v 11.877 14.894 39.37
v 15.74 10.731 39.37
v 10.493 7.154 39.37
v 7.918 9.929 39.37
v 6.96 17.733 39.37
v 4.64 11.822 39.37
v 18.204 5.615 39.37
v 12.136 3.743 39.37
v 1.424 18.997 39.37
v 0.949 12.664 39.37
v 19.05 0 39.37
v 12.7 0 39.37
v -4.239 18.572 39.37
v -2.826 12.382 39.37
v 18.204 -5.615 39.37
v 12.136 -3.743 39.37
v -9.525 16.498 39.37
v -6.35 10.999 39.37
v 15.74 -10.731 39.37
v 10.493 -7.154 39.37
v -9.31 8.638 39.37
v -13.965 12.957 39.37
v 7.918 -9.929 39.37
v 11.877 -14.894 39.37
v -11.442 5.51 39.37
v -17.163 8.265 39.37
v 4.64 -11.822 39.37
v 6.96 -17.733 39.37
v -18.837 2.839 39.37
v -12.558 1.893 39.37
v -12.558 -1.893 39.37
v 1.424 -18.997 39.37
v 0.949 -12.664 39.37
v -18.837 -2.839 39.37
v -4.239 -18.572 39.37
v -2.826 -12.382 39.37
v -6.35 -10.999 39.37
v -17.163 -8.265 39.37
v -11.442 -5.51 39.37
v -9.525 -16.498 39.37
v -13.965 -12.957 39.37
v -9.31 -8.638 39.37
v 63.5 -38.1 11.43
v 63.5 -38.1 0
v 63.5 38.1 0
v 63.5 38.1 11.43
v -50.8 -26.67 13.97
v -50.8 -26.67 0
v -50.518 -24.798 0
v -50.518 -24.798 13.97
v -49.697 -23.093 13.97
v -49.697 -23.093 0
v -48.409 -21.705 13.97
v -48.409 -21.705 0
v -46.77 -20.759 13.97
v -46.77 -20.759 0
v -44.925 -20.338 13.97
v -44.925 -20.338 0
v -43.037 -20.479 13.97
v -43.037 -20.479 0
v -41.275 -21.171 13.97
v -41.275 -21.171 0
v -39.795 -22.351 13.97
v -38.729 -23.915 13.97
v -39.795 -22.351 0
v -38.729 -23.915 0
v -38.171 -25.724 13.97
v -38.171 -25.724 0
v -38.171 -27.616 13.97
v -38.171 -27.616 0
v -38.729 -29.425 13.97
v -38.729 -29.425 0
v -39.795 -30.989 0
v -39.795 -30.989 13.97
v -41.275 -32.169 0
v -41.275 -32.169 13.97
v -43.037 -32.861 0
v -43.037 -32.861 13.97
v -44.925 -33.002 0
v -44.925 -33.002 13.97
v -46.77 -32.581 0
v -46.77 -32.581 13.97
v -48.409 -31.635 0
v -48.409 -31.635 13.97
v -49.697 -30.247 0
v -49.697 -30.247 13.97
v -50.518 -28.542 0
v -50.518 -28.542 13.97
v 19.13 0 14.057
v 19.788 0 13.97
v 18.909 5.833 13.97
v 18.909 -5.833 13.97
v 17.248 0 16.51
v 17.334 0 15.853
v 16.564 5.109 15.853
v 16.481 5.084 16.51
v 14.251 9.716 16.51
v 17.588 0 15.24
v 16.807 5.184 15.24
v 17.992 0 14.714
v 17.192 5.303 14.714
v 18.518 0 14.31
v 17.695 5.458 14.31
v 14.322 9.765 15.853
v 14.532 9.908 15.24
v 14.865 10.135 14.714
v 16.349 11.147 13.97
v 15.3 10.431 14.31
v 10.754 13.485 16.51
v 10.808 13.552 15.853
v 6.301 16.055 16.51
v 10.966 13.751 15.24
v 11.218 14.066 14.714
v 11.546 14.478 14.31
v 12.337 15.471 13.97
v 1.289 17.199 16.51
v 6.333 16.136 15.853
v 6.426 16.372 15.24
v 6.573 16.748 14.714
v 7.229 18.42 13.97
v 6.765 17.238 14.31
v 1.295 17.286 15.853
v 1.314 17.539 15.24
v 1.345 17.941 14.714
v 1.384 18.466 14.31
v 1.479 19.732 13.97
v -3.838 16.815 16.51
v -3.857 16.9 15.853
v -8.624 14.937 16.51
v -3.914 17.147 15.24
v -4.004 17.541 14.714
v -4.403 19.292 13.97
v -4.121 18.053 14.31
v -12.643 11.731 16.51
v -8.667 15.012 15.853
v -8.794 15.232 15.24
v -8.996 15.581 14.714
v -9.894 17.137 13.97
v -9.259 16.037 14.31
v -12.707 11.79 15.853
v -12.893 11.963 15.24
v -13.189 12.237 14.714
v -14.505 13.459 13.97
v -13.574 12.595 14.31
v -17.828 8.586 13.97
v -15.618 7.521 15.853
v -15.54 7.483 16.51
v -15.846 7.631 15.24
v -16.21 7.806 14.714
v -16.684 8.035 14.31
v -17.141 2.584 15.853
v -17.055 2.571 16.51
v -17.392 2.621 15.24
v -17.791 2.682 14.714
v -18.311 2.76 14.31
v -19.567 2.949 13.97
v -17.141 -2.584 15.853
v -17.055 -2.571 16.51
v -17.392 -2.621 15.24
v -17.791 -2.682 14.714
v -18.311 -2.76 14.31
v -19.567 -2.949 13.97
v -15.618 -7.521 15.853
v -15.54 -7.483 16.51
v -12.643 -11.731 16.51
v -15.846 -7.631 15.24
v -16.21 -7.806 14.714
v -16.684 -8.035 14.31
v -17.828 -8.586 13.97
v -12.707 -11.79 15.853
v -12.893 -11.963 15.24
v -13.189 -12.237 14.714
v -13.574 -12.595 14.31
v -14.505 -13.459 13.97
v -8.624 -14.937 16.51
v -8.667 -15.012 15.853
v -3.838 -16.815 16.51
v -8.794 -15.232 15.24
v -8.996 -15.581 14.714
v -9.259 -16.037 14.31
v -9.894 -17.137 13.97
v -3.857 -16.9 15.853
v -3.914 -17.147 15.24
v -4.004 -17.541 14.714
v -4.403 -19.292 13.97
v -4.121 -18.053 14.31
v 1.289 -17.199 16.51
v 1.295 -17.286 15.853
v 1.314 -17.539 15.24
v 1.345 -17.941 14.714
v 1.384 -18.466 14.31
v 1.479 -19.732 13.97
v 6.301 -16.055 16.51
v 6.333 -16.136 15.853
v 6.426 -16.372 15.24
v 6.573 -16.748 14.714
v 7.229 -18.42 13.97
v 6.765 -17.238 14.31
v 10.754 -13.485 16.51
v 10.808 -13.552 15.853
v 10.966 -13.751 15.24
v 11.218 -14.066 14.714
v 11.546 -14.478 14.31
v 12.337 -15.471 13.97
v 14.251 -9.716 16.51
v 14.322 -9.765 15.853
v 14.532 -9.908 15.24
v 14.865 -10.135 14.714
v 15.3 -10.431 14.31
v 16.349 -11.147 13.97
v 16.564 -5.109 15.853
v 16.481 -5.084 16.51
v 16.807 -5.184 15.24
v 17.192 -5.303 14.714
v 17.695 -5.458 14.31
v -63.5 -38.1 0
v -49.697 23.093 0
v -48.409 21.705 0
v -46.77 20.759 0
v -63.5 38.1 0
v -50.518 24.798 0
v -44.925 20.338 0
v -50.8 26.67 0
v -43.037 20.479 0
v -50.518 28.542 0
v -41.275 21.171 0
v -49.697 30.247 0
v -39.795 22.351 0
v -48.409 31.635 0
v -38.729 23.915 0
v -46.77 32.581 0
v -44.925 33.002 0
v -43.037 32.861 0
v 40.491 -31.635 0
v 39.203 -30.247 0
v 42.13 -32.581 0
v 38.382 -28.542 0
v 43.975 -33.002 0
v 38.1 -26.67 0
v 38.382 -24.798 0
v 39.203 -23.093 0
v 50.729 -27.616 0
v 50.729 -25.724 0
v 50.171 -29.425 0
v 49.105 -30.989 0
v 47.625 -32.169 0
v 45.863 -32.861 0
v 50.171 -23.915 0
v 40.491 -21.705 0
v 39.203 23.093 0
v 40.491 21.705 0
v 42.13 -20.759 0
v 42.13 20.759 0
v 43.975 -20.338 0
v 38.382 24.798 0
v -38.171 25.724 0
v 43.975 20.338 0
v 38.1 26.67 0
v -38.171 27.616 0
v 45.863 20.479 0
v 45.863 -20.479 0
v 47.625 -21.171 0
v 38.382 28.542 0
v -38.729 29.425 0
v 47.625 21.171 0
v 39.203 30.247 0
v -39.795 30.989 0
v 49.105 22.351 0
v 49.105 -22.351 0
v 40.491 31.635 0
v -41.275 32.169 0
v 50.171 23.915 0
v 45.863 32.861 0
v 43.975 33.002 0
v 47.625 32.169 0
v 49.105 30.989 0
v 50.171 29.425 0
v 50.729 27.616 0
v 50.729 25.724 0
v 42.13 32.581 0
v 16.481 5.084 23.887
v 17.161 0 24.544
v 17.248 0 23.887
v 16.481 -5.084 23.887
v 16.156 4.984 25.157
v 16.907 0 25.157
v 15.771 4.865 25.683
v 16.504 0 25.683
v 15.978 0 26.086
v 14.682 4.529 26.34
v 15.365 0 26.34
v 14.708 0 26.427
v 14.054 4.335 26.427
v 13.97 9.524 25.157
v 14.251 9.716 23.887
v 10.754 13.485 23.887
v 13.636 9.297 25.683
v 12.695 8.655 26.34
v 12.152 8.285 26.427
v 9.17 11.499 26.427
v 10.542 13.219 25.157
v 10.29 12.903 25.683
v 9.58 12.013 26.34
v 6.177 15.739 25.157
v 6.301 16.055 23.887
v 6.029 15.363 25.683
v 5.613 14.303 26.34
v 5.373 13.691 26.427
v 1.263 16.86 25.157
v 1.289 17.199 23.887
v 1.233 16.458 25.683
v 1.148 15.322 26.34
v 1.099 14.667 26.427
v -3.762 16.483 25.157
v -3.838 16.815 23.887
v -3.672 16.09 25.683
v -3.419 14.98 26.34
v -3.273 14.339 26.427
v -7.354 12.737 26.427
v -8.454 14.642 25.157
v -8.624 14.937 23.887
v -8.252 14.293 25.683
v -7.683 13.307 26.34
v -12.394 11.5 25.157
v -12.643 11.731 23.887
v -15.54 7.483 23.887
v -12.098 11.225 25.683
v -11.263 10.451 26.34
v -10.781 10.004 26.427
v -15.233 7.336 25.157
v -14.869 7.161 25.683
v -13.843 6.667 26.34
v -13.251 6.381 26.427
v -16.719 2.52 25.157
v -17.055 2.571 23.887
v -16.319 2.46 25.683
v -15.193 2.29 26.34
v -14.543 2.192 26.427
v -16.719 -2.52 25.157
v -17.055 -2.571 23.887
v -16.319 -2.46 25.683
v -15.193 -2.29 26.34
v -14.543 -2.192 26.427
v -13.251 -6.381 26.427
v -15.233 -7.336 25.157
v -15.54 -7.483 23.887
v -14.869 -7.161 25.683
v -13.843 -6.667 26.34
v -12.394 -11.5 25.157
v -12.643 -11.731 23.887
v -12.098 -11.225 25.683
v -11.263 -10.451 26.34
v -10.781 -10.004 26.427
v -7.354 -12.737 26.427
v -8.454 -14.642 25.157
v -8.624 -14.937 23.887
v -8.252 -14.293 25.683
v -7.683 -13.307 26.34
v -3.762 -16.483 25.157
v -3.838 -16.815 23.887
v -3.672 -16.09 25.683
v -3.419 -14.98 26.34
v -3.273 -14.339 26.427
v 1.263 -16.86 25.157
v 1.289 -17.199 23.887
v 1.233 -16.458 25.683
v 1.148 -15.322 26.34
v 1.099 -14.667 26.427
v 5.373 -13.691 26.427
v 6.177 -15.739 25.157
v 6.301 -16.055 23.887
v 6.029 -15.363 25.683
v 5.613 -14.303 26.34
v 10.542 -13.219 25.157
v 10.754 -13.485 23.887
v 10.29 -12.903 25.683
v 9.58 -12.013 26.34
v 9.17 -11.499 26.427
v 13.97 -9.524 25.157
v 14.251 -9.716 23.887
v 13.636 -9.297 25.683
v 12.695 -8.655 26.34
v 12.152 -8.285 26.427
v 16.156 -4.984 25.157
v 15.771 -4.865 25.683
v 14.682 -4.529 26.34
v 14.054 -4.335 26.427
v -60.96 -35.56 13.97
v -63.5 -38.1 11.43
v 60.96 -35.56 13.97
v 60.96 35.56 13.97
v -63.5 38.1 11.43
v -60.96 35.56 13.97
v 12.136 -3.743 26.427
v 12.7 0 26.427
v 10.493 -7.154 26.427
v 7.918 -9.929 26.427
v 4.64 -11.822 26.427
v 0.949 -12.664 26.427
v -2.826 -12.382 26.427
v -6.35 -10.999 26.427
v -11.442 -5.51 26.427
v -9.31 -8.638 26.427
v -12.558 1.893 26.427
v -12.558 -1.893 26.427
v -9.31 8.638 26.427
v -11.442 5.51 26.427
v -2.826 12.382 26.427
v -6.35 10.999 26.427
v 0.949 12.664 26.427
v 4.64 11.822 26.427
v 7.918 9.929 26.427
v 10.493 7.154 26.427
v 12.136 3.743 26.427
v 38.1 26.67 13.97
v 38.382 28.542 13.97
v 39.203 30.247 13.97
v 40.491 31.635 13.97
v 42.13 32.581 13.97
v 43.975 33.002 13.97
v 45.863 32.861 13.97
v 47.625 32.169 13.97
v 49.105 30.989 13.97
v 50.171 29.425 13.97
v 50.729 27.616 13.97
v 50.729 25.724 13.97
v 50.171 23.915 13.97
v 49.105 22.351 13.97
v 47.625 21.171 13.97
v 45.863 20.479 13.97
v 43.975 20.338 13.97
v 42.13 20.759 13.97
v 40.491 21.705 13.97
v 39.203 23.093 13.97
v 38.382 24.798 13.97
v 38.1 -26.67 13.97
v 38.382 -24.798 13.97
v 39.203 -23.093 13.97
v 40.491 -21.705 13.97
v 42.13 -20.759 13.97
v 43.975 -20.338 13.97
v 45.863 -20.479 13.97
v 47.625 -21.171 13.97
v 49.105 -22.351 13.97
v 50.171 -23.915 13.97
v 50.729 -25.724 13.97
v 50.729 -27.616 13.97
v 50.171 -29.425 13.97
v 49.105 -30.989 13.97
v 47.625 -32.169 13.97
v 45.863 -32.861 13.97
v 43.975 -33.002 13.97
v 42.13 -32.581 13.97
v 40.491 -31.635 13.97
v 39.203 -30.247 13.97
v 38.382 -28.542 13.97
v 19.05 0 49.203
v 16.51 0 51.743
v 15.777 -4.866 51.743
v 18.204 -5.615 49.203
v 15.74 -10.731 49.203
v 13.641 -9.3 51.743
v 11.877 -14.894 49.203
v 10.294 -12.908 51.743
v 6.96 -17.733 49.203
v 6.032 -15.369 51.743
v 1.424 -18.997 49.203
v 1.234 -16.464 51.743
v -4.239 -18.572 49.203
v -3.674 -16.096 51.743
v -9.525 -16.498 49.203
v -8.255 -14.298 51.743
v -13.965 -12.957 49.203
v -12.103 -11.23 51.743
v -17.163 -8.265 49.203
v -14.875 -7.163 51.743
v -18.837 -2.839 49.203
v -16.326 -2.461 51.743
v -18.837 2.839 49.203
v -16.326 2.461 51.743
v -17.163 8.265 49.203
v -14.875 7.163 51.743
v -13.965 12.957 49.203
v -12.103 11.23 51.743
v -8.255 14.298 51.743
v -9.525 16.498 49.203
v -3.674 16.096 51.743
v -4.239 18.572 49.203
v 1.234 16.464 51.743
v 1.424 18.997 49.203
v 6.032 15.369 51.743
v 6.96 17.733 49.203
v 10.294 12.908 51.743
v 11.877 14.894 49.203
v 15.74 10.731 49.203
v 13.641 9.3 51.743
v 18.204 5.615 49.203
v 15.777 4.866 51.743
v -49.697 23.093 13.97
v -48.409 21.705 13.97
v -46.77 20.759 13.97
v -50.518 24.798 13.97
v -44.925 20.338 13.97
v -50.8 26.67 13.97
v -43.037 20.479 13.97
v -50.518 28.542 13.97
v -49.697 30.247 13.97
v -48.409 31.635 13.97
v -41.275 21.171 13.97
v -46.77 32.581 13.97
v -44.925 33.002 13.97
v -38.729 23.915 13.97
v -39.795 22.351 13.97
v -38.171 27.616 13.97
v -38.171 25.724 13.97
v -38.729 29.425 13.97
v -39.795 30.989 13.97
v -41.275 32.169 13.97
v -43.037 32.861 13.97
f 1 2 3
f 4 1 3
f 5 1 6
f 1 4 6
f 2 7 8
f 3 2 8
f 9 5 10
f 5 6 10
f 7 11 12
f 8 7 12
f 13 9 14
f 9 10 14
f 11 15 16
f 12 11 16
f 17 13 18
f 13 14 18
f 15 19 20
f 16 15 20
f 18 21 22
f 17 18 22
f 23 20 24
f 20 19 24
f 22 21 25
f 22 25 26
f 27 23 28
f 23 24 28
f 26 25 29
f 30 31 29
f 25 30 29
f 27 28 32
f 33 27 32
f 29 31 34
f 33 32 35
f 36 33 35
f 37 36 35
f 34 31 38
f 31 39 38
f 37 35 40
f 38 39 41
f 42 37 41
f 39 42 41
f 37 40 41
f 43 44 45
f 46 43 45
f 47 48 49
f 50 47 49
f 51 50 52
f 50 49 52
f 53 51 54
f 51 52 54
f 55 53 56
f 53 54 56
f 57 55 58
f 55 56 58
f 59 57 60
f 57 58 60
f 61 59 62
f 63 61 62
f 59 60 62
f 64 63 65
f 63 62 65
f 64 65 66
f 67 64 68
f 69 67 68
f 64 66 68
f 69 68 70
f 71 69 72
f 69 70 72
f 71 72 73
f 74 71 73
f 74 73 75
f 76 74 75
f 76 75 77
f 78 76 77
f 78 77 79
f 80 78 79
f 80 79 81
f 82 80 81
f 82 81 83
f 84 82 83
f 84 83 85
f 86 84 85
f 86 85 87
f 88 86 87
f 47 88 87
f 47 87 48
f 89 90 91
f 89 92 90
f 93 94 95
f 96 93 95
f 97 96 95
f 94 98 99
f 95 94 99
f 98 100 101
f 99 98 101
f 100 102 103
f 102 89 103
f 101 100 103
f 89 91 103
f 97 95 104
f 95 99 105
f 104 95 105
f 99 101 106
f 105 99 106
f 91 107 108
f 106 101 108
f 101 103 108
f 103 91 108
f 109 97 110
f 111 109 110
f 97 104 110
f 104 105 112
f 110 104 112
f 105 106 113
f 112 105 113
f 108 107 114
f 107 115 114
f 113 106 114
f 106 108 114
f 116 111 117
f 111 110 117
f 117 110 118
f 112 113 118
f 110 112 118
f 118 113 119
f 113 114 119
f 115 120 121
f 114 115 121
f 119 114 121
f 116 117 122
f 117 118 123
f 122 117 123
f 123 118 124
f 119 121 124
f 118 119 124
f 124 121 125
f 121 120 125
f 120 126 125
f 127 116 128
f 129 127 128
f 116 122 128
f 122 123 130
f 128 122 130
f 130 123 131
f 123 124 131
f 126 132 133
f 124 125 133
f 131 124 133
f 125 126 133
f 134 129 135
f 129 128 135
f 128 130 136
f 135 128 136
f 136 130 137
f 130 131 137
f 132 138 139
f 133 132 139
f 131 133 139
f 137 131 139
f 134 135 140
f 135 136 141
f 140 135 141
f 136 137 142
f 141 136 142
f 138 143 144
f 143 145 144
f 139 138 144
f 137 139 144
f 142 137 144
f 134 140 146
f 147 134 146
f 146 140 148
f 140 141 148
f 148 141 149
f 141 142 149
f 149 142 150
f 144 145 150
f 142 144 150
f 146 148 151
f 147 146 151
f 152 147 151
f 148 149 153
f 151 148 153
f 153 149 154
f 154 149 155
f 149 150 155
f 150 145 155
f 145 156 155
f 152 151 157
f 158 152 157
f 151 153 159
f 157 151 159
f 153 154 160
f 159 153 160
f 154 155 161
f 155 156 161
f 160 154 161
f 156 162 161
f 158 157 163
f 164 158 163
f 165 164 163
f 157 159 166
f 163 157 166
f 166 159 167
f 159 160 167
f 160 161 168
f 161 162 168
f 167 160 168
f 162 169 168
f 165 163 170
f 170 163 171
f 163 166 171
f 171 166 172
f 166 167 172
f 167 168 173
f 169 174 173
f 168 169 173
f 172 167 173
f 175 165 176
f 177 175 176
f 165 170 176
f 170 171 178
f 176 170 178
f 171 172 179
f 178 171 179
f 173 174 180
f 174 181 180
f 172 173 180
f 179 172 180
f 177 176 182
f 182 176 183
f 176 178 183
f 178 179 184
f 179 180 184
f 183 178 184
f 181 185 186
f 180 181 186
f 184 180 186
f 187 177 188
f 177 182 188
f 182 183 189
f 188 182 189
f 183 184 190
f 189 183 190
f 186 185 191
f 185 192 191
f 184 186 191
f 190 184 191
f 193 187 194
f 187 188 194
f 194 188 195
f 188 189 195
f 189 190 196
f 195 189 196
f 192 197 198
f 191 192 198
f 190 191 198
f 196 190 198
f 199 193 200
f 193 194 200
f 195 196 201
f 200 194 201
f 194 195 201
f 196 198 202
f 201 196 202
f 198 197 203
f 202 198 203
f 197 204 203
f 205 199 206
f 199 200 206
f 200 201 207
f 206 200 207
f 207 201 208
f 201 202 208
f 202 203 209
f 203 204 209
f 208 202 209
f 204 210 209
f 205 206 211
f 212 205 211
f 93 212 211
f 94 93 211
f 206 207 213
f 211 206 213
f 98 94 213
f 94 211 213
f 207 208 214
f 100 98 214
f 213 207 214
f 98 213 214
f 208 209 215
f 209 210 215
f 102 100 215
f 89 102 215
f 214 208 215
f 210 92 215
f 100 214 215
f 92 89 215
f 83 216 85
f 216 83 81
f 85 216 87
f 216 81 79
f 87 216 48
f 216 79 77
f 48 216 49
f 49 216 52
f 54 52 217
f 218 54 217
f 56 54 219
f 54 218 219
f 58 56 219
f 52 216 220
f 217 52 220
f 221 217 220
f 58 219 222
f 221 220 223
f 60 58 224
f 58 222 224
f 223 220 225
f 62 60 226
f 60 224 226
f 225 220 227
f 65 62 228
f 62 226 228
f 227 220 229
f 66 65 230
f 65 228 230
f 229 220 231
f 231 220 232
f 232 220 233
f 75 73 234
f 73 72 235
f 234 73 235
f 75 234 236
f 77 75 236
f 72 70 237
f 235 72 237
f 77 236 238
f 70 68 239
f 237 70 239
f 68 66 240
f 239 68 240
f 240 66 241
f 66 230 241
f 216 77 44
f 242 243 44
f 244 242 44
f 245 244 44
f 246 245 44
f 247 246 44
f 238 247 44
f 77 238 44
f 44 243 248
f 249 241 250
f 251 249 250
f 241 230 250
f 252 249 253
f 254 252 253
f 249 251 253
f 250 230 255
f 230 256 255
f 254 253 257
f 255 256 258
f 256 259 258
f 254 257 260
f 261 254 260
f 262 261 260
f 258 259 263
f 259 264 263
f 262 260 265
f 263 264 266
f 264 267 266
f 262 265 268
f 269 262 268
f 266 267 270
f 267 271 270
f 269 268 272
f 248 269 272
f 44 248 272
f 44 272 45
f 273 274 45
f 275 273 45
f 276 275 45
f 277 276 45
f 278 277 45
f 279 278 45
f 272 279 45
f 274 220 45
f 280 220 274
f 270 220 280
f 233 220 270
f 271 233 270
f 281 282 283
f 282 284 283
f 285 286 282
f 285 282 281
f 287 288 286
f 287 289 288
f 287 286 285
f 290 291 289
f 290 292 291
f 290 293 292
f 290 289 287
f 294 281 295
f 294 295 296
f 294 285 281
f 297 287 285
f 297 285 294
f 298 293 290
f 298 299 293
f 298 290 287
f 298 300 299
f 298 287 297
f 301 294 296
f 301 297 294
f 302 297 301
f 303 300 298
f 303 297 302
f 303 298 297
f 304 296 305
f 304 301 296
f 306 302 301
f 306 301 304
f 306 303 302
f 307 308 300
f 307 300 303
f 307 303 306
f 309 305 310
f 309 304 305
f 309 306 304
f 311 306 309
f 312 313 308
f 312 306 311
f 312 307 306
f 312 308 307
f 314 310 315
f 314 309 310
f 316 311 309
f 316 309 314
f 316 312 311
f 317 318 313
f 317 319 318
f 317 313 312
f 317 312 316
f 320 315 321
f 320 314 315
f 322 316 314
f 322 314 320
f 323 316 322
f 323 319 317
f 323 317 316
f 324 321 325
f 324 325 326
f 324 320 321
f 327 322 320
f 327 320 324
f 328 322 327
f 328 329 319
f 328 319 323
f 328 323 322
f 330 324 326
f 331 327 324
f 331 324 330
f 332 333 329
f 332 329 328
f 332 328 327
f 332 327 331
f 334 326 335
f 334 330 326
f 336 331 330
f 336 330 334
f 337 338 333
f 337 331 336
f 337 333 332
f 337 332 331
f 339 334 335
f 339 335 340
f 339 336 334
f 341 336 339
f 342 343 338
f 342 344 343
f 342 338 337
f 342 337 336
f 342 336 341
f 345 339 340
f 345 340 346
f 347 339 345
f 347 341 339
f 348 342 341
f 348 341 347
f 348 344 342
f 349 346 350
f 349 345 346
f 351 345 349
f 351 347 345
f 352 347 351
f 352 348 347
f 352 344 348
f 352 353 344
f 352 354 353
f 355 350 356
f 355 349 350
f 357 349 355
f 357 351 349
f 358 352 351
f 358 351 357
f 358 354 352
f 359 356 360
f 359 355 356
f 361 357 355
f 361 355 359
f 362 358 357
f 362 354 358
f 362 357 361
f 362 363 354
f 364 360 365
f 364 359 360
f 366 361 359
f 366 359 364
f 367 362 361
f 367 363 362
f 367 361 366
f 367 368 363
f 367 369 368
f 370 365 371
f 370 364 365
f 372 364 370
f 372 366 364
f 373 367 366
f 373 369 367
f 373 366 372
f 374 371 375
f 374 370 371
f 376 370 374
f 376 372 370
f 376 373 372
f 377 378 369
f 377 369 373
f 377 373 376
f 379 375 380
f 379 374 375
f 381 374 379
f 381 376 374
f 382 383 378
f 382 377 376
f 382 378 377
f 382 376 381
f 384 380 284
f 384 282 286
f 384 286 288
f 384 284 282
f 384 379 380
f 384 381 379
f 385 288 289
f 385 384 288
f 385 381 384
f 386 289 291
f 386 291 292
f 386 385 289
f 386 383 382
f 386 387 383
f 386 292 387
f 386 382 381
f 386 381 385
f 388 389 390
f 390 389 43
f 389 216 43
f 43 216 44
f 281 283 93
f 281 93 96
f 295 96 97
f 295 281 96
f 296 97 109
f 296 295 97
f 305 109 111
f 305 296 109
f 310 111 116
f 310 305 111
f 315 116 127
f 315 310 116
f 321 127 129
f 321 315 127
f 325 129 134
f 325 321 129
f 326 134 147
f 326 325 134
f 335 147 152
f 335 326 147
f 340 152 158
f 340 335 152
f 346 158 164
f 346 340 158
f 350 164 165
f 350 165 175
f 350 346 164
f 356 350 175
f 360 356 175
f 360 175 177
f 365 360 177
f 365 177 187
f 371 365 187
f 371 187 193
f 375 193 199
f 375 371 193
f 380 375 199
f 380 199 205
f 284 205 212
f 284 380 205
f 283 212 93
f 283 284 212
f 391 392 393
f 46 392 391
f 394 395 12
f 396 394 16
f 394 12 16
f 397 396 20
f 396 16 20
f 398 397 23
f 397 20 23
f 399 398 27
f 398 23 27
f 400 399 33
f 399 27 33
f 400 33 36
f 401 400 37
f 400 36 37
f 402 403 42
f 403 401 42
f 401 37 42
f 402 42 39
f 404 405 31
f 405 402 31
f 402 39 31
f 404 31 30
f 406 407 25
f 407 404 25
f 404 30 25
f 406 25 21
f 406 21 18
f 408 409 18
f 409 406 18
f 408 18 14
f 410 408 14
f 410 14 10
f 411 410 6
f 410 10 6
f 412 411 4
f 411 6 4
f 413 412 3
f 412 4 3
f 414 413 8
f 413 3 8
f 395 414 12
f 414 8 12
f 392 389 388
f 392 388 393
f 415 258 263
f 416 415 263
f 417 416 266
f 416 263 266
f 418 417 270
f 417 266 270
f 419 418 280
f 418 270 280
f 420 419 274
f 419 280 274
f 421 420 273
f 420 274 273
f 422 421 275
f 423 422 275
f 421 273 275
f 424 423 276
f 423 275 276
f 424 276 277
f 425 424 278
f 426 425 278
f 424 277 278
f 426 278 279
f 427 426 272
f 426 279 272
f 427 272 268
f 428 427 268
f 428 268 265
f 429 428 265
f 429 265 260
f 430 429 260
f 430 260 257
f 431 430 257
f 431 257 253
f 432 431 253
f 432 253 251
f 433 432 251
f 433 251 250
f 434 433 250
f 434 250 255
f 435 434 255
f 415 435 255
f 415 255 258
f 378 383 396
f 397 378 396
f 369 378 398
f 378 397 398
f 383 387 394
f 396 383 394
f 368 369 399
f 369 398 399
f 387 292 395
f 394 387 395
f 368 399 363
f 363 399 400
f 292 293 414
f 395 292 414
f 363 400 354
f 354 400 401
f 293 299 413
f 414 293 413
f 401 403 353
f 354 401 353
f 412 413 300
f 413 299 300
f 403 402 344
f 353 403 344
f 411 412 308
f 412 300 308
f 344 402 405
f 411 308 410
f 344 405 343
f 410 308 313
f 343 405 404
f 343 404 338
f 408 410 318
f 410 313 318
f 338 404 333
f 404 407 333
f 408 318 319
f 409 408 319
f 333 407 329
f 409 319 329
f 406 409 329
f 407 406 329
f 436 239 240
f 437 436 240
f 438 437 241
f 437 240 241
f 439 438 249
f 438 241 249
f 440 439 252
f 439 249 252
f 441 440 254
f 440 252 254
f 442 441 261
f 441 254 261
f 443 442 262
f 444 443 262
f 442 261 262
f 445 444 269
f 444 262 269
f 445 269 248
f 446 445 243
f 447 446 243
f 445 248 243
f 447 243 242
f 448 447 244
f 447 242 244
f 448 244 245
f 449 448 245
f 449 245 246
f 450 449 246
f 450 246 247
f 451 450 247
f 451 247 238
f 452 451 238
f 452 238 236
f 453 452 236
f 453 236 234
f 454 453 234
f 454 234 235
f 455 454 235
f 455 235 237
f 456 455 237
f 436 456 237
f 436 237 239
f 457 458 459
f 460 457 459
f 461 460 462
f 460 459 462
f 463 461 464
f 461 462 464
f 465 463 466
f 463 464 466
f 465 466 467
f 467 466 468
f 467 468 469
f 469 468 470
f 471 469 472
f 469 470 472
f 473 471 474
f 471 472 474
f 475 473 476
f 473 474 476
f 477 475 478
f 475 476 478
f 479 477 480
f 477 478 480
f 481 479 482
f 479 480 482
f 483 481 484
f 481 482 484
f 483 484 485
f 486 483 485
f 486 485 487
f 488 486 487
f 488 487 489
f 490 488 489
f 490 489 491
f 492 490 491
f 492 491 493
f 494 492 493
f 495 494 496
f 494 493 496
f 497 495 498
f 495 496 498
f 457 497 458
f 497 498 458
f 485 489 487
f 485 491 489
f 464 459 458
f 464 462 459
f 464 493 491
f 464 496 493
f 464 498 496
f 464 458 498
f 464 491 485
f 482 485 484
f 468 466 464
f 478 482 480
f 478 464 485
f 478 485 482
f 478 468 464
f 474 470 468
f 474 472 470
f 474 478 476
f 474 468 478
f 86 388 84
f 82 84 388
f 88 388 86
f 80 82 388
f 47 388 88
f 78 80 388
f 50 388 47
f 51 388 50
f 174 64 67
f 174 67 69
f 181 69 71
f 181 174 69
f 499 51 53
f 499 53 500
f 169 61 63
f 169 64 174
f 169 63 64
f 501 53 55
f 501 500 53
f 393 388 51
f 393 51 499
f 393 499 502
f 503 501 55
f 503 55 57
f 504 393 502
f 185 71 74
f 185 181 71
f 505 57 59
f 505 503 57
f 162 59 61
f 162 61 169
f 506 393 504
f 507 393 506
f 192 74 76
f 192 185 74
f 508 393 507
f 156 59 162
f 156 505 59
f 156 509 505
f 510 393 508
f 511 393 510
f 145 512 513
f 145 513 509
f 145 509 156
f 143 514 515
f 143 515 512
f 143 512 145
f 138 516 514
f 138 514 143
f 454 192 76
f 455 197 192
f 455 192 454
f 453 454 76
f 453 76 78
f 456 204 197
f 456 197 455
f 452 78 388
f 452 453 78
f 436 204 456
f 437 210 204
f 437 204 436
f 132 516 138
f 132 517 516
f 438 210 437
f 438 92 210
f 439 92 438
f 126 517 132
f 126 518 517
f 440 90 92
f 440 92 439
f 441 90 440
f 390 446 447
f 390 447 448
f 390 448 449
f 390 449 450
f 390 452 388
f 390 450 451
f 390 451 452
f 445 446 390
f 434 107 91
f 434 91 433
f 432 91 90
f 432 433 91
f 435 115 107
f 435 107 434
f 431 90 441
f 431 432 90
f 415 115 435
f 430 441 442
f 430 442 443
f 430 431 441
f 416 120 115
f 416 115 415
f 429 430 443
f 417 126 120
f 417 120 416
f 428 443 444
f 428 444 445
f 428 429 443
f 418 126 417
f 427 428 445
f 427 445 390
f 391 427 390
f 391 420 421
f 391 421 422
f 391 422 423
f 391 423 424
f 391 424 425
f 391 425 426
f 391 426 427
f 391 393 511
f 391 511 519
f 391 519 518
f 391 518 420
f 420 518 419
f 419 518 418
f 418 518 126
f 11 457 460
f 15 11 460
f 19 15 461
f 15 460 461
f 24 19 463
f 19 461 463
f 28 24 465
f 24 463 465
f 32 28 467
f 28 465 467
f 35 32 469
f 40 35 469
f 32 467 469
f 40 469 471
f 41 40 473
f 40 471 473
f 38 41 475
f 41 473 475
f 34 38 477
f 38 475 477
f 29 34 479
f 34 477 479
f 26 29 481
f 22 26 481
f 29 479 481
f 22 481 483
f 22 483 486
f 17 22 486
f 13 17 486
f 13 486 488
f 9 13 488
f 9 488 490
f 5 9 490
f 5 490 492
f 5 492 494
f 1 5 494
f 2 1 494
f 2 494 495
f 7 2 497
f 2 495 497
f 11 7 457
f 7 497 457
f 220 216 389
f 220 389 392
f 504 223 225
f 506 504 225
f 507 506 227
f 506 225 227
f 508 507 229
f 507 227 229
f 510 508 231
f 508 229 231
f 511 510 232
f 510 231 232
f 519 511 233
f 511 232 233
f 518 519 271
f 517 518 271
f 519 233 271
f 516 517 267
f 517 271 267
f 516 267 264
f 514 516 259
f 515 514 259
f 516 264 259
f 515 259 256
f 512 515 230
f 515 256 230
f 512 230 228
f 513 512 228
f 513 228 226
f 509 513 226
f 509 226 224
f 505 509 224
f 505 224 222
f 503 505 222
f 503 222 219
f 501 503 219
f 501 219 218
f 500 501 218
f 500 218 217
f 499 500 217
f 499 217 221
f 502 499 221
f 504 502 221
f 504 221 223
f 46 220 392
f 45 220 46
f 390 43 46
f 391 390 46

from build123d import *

# Parameters (mm, degrees)
F0_W     = 127
F0_H     = 76.2
F1_DEPTH = 13.97
F3_D     = 12.7
F4_W     = 12.7
F4_H     = 25.4
F6_W     = 19.05
F6_H     = 12.372993
F8_W     = 9.582032
F8_H     = 12.456644
F10_R    = 2.54
F11_SIZE = 2.54
F12_SIZE = 2.54


with BuildPart() as f1:
    # F0 (on Top) → F1 (new body)
    with BuildSketch(Plane.XY):
        Rectangle(F0_W, F0_H)
    extrude(amount=F1_DEPTH)

    # F3 (through all)
    with Locations(Plane.XY.offset(13.97)):
        with Locations((-44.45, 26.67), (-44.45, -26.67), (44.45, 26.67), (44.45, -26.67)):
            Hole(F3_D / 2)

    # F4 (on Front) → F5 (revolve)
    with BuildSketch(Plane.XZ):
        with Locations((6.35, 26.67)):
            Rectangle(F4_W, F4_H)
    revolve(axis=Axis((0, 0, 26.67), (0, 0, -1)))

    # F6 (on Front) → F7 (revolve)
    with BuildSketch(Plane.XZ):
        with Locations((9.525, 45.556496)):
            Rectangle(F6_W, F6_H)
    revolve(axis=Axis((0, 0, 45.556497), (0, 0, -1)))

    # F8 (on Front) → F9 (revolve)
    with BuildSketch(Plane.XZ):
        with Locations((12.456648, 20.198322)):
            Rectangle(F8_W, F8_H)
    revolve(axis=Axis((0, 0, 13.97), (0, 0, 1)))

    # F10
    f10_edges = [f1.edges().sort_by_distance(p)[0] for p in [
        (-17.247664, 0, 26.426644),
        (-17.247664, 0, 13.97),
        (17.247664, 0, 20.198322),
    ]]
    fillet(f10_edges, radius=F10_R)

    # F11
    f11_edges = [f1.edges().sort_by_distance(p)[0] for p in [
        (-19.05, 0, 51.742993),
    ]]
    chamfer(f11_edges, length=F11_SIZE)

    # F12
    f12_edges = [f1.edges().sort_by_distance(p)[0] for p in [
        (0, -38.1, 13.97),
        (-63.5, 0, 13.97),
        (0, 38.1, 13.97),
        (63.5, 0, 13.97),
    ]]
    chamfer(f12_edges, length=F12_SIZE)


solid = f1.part
